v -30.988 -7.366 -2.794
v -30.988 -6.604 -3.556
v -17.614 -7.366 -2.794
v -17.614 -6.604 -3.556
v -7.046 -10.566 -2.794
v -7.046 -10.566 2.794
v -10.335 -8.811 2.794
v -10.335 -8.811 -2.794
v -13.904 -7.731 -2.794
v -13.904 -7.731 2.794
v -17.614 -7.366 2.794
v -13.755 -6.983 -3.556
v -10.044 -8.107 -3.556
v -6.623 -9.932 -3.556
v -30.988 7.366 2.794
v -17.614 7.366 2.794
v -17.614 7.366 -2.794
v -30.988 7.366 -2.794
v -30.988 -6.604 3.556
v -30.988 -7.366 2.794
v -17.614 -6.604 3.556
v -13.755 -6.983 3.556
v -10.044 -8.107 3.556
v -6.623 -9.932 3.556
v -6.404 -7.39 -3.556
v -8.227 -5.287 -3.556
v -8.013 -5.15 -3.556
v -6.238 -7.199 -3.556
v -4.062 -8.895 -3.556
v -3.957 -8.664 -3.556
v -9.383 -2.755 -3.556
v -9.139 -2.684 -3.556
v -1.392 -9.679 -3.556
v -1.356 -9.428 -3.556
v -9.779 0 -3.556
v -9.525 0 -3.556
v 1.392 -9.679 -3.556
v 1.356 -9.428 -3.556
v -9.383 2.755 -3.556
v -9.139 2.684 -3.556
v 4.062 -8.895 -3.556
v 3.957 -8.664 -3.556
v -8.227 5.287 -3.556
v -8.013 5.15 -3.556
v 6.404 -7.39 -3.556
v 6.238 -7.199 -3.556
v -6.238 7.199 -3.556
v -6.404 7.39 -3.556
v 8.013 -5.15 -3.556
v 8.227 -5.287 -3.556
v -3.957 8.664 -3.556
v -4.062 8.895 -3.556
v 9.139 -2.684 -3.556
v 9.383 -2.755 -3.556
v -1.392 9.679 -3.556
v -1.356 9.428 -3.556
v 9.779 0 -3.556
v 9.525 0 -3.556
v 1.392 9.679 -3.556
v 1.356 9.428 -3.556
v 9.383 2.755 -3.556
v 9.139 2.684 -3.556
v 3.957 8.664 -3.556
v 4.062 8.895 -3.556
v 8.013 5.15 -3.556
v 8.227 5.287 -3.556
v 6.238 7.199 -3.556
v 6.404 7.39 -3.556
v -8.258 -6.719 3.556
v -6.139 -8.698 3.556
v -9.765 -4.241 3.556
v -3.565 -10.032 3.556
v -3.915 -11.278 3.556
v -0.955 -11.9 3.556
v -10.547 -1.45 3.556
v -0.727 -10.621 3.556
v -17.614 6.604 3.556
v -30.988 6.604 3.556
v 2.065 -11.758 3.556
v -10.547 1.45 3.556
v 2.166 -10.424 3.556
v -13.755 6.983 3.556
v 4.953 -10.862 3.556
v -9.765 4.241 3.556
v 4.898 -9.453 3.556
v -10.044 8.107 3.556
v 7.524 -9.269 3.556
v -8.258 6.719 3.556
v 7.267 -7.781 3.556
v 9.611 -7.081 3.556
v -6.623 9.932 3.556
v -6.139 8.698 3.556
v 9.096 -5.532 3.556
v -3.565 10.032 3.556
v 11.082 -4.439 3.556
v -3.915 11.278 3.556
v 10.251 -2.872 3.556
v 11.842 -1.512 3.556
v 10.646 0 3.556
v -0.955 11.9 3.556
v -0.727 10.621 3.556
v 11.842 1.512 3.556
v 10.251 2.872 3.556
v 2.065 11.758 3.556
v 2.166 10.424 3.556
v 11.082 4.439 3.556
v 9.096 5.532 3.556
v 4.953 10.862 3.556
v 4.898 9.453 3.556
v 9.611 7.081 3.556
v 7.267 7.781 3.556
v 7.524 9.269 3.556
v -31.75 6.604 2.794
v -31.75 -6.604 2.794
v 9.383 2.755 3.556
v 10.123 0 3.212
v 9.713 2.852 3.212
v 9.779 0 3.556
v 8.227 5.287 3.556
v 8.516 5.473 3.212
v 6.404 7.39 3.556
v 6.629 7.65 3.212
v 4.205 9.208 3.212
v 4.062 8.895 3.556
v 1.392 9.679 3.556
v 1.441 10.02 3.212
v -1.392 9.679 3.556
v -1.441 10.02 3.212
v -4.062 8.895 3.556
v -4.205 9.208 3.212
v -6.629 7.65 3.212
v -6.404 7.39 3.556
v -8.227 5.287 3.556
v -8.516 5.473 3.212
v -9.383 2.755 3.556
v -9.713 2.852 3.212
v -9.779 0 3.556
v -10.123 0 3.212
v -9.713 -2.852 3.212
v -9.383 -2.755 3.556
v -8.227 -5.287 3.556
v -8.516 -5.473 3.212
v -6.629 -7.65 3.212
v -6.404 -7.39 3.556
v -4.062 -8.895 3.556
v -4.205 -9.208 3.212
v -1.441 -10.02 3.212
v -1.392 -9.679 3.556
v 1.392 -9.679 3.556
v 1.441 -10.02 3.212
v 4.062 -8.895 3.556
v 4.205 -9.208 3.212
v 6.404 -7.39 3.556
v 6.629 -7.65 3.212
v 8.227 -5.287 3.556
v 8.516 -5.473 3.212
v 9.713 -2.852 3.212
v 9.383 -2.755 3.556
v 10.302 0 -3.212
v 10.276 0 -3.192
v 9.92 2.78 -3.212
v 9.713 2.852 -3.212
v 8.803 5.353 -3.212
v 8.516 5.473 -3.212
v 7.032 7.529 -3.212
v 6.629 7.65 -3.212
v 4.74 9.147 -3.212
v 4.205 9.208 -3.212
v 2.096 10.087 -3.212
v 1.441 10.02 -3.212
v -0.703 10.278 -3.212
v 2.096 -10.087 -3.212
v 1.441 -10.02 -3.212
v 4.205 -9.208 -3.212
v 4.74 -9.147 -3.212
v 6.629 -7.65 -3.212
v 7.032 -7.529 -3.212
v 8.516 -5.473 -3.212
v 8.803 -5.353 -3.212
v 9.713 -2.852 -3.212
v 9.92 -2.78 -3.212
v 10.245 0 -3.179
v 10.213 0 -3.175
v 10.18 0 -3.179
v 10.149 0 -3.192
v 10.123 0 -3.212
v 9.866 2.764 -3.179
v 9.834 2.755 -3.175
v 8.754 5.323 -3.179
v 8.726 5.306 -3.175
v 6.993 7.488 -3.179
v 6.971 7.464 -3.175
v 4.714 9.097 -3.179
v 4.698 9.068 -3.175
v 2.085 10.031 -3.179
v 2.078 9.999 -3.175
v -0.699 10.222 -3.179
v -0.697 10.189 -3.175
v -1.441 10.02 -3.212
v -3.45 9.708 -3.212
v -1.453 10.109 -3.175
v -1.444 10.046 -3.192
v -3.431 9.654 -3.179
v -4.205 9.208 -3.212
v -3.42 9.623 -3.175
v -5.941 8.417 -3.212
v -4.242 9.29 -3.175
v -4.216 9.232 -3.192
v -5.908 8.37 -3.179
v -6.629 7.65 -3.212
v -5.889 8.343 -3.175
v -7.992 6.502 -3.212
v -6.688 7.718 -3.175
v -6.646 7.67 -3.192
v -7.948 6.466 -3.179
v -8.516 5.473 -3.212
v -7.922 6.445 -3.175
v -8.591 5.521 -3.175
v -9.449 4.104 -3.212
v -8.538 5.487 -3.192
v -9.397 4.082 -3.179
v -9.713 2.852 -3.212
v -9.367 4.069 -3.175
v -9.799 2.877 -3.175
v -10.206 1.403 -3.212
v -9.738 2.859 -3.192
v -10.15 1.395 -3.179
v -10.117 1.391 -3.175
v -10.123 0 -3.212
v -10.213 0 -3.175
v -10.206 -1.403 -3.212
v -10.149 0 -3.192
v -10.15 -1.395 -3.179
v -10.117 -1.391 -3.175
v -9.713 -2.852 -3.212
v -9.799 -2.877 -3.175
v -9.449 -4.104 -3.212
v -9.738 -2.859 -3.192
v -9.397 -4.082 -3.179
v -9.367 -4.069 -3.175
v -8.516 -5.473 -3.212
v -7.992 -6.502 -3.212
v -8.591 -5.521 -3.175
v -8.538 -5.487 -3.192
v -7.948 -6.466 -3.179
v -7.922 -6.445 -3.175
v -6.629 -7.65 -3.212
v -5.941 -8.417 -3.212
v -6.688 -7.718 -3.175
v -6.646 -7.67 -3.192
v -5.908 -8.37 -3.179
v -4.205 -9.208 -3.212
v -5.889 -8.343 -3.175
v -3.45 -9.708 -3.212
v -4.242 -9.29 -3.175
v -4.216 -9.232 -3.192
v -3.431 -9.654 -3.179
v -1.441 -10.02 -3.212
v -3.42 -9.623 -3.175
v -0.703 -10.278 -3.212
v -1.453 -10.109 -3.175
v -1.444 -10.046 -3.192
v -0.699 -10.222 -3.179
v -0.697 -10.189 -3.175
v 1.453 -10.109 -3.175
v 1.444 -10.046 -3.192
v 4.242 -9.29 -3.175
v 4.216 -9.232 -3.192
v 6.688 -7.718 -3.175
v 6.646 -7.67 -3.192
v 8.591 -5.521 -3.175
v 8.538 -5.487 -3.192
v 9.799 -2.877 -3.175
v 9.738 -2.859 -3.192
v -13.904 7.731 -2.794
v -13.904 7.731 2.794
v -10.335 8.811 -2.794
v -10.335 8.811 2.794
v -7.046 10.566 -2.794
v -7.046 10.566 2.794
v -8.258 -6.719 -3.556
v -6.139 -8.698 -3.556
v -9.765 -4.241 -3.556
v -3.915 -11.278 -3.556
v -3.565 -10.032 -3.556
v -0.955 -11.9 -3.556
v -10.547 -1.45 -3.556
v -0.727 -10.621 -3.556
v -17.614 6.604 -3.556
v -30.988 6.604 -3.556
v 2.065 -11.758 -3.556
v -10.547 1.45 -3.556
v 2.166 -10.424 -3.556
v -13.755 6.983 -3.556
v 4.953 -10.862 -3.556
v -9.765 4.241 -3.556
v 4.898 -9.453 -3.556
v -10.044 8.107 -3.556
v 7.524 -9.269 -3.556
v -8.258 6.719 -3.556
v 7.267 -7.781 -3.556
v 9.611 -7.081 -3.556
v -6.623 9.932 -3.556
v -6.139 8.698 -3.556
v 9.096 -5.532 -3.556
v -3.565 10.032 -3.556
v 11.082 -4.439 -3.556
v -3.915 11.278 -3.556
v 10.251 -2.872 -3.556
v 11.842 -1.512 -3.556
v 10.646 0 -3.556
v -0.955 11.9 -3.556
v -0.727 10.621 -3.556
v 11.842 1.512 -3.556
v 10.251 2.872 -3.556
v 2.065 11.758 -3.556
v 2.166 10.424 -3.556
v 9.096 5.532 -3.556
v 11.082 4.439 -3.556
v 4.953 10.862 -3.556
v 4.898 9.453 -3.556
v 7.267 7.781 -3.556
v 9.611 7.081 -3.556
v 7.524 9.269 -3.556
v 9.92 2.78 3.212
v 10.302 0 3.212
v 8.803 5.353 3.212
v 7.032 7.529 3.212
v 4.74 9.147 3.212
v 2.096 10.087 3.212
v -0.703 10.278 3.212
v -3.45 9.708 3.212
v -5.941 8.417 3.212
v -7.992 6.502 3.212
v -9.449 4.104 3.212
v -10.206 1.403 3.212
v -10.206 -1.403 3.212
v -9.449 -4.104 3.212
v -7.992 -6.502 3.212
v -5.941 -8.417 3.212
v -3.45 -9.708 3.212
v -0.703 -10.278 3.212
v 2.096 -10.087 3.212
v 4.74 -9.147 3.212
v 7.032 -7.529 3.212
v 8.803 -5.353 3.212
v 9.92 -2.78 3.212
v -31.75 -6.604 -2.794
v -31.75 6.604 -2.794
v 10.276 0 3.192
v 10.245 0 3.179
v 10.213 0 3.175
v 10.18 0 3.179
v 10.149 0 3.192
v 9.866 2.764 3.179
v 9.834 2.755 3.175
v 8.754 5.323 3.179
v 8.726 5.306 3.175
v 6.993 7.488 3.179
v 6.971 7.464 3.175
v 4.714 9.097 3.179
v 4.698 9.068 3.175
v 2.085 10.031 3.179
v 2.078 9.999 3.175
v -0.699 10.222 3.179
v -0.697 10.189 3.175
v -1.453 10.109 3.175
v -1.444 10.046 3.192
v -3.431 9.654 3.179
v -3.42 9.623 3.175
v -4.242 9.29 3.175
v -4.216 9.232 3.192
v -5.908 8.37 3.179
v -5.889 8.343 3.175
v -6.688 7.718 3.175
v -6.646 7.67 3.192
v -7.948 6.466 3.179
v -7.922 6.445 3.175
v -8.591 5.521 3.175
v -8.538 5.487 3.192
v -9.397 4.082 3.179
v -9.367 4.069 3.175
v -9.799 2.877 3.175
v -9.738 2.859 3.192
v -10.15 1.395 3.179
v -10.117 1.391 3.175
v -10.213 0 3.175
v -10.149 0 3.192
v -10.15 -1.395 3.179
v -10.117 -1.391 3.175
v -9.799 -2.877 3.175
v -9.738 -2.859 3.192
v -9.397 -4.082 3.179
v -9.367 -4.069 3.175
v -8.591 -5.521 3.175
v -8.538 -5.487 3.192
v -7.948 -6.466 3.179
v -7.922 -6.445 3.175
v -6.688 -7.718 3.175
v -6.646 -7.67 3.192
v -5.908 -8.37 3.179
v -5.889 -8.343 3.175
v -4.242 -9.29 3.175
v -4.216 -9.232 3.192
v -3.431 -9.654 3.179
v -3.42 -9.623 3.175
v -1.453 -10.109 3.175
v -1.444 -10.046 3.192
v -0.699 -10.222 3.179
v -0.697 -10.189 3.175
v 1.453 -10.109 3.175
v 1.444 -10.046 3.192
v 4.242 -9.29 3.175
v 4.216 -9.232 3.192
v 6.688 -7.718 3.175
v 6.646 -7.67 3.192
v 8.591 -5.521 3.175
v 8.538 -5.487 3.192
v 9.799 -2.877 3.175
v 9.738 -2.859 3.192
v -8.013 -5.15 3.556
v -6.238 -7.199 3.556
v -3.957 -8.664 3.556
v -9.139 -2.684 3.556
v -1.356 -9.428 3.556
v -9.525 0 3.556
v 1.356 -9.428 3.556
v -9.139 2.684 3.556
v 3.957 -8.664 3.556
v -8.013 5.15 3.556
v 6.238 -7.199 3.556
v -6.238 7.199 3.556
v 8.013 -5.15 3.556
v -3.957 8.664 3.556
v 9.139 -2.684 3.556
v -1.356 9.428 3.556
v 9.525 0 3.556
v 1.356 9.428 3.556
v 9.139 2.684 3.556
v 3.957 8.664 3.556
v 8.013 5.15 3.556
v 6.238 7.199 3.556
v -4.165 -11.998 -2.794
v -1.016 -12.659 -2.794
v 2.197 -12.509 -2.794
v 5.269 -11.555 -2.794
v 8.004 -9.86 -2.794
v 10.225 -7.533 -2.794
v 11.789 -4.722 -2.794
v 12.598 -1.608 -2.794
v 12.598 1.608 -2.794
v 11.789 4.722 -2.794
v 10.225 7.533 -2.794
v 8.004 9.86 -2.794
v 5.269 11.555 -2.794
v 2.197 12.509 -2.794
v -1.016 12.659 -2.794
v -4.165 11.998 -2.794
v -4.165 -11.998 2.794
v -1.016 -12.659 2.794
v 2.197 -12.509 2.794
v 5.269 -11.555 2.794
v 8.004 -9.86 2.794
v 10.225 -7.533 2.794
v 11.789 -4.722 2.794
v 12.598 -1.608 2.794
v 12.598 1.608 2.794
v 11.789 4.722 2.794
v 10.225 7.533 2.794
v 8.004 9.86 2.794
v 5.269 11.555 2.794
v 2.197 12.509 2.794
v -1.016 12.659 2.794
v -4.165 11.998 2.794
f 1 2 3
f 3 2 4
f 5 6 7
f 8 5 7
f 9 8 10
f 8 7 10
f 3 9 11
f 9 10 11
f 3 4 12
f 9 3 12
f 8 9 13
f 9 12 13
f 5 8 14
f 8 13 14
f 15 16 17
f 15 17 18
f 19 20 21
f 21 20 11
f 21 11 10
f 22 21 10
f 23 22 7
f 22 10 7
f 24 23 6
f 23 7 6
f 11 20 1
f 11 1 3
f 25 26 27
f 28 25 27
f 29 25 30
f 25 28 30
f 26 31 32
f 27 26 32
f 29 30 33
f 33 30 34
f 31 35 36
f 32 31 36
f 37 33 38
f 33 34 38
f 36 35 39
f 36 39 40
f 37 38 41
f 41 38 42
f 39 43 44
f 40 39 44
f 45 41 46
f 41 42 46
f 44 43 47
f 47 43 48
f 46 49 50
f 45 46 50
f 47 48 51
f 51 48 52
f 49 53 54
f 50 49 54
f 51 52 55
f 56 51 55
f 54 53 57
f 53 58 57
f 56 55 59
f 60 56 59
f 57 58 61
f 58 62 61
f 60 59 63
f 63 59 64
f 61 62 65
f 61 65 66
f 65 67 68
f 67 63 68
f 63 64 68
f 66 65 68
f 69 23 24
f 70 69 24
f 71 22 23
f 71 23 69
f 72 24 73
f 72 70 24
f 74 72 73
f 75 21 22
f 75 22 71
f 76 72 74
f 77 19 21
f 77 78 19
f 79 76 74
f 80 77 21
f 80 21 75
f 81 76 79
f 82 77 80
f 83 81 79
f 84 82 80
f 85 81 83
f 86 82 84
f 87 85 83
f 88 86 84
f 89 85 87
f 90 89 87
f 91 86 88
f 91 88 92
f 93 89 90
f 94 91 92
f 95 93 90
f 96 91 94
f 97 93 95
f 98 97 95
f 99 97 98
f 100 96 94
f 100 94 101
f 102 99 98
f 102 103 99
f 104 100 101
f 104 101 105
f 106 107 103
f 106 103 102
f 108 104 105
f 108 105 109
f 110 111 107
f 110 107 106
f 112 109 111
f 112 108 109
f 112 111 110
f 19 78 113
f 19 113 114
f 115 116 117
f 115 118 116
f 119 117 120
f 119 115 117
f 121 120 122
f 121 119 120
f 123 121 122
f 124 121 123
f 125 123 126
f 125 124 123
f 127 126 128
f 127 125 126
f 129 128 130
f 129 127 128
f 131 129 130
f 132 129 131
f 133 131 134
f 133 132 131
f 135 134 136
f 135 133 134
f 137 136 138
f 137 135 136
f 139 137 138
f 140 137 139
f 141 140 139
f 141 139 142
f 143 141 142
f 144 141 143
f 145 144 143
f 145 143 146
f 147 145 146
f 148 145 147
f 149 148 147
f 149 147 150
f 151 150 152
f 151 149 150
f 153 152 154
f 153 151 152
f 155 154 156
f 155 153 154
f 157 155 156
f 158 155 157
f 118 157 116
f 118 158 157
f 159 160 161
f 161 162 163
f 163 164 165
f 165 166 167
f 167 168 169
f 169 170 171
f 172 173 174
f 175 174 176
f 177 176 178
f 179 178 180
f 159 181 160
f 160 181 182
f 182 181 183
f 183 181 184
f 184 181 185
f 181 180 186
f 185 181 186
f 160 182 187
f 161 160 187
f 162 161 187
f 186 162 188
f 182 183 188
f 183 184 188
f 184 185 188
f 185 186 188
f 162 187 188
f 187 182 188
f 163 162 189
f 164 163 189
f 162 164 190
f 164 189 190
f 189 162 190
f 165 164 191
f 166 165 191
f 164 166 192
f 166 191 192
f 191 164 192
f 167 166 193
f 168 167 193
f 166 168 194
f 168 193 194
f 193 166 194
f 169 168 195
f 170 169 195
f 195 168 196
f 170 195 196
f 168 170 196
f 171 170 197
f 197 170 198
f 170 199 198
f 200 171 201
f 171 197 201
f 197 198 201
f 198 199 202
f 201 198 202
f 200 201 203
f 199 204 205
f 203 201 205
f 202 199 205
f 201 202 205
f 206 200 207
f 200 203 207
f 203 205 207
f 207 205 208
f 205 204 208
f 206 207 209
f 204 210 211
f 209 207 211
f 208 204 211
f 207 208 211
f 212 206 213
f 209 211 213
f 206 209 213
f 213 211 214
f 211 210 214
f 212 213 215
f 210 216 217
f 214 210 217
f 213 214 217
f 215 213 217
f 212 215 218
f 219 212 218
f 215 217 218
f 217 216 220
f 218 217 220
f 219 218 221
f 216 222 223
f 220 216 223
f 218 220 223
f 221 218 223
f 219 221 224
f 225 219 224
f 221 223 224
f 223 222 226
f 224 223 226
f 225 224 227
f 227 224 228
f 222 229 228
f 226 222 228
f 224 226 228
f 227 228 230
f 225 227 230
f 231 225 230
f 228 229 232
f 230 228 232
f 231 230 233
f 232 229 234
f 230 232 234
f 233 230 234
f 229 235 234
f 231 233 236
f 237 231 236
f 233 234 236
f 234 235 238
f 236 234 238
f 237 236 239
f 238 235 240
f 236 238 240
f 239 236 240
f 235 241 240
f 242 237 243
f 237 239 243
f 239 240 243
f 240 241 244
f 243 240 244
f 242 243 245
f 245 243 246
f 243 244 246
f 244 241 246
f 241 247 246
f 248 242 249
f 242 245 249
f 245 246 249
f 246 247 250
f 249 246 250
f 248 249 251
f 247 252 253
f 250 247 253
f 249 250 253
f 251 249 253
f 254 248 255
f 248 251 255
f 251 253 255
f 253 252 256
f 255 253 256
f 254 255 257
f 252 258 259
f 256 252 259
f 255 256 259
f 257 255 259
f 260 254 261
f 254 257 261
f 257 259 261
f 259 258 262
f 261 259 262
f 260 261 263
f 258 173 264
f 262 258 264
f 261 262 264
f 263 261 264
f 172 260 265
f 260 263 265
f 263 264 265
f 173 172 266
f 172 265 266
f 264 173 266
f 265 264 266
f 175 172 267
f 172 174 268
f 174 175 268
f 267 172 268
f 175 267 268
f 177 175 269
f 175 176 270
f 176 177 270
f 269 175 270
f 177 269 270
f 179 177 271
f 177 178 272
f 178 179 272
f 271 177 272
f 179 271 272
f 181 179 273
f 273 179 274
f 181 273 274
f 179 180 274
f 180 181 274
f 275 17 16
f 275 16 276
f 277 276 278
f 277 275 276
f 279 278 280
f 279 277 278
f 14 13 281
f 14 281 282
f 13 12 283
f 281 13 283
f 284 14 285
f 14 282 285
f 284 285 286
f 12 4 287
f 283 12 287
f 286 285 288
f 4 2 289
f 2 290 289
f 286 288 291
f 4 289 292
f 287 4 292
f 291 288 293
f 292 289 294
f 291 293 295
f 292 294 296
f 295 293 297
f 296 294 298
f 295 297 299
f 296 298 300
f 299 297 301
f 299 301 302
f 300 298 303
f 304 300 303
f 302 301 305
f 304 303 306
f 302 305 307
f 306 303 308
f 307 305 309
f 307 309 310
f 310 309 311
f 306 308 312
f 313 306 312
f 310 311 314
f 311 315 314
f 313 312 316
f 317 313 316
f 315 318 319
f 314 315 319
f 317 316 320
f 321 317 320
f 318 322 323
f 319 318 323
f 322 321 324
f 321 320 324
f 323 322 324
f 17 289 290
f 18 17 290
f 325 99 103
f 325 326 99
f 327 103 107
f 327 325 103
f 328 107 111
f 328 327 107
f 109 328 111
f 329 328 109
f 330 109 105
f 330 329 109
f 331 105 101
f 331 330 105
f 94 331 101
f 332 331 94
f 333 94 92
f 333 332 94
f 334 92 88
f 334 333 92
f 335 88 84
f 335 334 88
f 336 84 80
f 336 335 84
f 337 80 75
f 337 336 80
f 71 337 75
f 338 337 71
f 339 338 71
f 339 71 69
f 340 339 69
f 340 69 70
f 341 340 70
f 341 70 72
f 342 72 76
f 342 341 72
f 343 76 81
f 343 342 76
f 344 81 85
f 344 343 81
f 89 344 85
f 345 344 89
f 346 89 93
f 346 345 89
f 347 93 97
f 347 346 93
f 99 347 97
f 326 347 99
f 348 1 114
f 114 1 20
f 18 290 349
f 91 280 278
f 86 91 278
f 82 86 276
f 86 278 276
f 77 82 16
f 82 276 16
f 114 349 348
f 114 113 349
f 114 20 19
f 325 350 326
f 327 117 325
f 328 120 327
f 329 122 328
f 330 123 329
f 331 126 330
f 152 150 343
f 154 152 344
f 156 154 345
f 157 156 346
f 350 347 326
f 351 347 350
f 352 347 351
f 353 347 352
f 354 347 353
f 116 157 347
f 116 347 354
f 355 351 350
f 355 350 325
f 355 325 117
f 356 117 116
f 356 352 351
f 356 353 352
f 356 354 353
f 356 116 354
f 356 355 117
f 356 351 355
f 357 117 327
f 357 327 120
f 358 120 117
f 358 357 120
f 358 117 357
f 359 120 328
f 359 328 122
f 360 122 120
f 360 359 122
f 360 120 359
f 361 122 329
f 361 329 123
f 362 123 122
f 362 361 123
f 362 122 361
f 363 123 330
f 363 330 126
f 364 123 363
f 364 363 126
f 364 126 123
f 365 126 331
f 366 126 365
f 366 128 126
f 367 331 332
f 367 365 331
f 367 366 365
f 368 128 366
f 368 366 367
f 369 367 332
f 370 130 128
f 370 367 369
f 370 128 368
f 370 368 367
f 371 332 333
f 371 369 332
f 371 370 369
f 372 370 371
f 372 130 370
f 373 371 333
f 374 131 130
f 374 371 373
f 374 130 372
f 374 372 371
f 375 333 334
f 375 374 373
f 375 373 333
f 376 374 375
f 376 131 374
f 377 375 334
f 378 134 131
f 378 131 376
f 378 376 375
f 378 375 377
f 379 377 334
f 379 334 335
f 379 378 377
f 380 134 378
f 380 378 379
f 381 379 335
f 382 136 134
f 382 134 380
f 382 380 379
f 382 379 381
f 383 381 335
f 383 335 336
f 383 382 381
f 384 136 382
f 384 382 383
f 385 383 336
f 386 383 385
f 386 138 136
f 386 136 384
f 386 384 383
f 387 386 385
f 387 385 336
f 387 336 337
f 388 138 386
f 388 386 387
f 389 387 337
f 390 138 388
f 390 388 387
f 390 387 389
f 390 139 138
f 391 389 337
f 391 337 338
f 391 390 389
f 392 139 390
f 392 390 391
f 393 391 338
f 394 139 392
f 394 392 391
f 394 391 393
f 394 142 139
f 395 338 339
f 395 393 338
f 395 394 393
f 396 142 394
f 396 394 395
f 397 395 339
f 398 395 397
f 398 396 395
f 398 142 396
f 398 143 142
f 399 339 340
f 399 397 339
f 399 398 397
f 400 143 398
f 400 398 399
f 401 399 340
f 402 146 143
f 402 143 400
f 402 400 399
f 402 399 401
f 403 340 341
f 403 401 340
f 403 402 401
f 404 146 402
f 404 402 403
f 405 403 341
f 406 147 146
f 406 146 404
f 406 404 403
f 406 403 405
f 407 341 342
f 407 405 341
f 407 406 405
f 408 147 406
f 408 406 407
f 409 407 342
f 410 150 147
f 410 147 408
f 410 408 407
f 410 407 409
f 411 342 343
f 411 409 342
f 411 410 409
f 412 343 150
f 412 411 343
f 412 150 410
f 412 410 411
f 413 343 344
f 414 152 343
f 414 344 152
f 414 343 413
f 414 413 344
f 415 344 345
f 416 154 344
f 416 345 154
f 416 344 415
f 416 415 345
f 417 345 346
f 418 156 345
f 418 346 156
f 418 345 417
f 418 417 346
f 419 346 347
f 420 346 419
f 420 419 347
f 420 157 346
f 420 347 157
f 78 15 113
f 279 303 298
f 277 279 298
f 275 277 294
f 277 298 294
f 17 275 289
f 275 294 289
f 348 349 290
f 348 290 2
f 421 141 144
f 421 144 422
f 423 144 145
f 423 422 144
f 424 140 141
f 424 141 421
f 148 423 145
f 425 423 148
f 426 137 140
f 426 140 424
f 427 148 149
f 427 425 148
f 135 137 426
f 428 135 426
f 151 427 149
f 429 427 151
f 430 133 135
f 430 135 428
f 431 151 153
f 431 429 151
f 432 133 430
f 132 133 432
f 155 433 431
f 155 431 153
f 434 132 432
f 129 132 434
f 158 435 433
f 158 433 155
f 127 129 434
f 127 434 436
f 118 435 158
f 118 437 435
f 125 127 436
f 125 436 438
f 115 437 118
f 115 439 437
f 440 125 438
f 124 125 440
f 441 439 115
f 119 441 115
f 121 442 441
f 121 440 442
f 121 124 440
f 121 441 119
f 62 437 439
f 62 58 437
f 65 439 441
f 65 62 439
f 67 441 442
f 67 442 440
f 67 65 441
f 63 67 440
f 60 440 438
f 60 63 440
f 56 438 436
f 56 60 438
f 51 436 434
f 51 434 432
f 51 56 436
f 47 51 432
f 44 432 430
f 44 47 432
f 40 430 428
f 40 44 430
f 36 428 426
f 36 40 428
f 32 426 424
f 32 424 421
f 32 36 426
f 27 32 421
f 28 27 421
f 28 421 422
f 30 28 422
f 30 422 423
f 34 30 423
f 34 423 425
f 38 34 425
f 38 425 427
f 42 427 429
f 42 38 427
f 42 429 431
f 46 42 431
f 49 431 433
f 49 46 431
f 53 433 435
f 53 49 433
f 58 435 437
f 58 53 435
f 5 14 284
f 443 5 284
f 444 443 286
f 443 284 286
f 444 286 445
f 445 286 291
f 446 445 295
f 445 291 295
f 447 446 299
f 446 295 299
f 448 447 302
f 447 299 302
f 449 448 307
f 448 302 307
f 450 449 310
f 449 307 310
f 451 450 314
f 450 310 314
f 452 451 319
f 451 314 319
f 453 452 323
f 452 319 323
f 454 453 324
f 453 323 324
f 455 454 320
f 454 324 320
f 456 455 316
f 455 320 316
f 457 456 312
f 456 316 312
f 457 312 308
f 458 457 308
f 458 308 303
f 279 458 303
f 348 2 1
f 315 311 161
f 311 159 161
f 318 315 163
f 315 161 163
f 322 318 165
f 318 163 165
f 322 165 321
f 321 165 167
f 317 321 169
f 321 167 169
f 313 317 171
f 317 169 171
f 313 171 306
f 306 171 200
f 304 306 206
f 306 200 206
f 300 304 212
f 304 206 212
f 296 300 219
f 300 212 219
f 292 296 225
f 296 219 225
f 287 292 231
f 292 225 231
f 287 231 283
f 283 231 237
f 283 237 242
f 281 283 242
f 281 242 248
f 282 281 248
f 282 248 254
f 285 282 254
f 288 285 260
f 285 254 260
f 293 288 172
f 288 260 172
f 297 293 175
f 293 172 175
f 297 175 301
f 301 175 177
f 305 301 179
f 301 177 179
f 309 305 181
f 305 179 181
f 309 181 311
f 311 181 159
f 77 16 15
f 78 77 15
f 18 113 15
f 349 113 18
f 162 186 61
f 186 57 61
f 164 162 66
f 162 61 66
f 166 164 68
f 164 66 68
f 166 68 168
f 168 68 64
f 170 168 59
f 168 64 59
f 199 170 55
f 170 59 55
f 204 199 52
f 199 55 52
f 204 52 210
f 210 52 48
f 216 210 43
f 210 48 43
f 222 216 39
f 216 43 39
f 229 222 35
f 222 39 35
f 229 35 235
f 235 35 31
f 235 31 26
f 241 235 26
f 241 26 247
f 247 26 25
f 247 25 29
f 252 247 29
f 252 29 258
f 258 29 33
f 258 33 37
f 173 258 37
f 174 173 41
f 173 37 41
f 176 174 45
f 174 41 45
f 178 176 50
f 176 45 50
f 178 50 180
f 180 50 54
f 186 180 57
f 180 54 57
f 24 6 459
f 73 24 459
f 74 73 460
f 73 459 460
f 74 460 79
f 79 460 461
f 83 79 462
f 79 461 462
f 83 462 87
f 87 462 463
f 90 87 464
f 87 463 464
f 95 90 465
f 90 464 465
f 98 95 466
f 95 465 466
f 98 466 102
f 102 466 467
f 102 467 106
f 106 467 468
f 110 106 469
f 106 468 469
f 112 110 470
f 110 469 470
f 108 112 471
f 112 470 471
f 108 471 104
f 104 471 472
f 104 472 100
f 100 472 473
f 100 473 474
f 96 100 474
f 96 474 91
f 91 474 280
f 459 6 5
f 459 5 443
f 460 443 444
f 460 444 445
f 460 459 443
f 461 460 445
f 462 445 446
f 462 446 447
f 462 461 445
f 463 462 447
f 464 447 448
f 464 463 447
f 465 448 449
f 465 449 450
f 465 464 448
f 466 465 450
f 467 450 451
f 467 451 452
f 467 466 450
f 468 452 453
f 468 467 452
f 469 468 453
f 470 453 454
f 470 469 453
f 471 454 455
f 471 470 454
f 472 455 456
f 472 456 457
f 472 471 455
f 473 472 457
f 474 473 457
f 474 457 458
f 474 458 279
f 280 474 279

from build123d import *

# Parameters (mm, degrees)
SKETCH1_R           = 9.525
BOSS_EXTRUDE1_DEPTH = 3.556
FILLET1_R           = 19.05
CHAMFER2_SIZE       = 0.762


with BuildPart() as part:
    # Sketch1 → Boss-Extrude1 (new body, symmetric)
    with BuildSketch(Plane.XY):
        with BuildLine():
            Line((-31.75, 7.366), (-31.75, -7.366))
            Line((-31.75, -7.366), (-10.345629222, -7.366))
            ThreePointArc((-10.345629222, -7.366), (12.7, 0), (-10.345629222, 7.366))
            Line((-10.345629222, 7.366), (-31.75, 7.366))
        make_face()
        Circle(SKETCH1_R, mode=Mode.SUBTRACT)
    extrude(amount=BOSS_EXTRUDE1_DEPTH, both=True)

    # Fillet1
    fillet1_edges = [part.edges().sort_by_distance(p)[0] for p in [
        (-10.345629222, 7.366, 0),
        (-10.345629222, -7.366, 0),
    ]]
    fillet(fillet1_edges, radius=FILLET1_R)

    # Chamfer2
    chamfer2_edges = [part.edges().sort_by_distance(p)[0] for p in [
        (-24.682063131, -7.366, 3.556),
        (-24.682063131, 7.366, -3.556),
        (-24.682063131, 7.366, 3.556),
        (12.7, 0, -3.556),
        (12.7, 0, 3.556),
        (-12.092911722, 8.183647162, -3.556),
        (-12.092911722, 8.183647162, 3.556),
        (-12.092911722, -8.183647162, -3.556),
        (-12.092911722, -8.183647162, 3.556),
        (-24.682063131, -7.366, -3.556),
        (-31.75, 0, -3.556),
        (-31.75, -7.366, 0),
        (-31.75, 7.366, 0),
        (-31.75, 0, 3.556),
    ]]
    chamfer(chamfer2_edges, length=CHAMFER2_SIZE)

    # Sketch2 → Cut-Revolve1 (revolve, cut)
    with BuildSketch(Plane(origin=(0, 0, 0), x_dir=(1, 0, 0), z_dir=(0, 1, 0))):
        with BuildLine():
            Line((10.646210245, 3.556), (10.302407684, 3.212197439))
            ThreePointArc((10.302407684, 3.212197439), (10.212605122, 3.175), (10.122802561, 3.212197439))
            Line((10.122802561, 3.212197439), (9.779, 3.556))
            Line((9.779, 3.556), (10.646210245, 3.556))
        make_face()
    cut_revolve1 = revolve(axis=Axis((0, 0, -14.192615474), (0, 0, 1)), mode=Mode.SUBTRACT)

    # Mirror1: Cut-Revolve1 across plane
    add(cut_revolve1.mirror(Plane.XY), mode=Mode.SUBTRACT)


solid = part.part
